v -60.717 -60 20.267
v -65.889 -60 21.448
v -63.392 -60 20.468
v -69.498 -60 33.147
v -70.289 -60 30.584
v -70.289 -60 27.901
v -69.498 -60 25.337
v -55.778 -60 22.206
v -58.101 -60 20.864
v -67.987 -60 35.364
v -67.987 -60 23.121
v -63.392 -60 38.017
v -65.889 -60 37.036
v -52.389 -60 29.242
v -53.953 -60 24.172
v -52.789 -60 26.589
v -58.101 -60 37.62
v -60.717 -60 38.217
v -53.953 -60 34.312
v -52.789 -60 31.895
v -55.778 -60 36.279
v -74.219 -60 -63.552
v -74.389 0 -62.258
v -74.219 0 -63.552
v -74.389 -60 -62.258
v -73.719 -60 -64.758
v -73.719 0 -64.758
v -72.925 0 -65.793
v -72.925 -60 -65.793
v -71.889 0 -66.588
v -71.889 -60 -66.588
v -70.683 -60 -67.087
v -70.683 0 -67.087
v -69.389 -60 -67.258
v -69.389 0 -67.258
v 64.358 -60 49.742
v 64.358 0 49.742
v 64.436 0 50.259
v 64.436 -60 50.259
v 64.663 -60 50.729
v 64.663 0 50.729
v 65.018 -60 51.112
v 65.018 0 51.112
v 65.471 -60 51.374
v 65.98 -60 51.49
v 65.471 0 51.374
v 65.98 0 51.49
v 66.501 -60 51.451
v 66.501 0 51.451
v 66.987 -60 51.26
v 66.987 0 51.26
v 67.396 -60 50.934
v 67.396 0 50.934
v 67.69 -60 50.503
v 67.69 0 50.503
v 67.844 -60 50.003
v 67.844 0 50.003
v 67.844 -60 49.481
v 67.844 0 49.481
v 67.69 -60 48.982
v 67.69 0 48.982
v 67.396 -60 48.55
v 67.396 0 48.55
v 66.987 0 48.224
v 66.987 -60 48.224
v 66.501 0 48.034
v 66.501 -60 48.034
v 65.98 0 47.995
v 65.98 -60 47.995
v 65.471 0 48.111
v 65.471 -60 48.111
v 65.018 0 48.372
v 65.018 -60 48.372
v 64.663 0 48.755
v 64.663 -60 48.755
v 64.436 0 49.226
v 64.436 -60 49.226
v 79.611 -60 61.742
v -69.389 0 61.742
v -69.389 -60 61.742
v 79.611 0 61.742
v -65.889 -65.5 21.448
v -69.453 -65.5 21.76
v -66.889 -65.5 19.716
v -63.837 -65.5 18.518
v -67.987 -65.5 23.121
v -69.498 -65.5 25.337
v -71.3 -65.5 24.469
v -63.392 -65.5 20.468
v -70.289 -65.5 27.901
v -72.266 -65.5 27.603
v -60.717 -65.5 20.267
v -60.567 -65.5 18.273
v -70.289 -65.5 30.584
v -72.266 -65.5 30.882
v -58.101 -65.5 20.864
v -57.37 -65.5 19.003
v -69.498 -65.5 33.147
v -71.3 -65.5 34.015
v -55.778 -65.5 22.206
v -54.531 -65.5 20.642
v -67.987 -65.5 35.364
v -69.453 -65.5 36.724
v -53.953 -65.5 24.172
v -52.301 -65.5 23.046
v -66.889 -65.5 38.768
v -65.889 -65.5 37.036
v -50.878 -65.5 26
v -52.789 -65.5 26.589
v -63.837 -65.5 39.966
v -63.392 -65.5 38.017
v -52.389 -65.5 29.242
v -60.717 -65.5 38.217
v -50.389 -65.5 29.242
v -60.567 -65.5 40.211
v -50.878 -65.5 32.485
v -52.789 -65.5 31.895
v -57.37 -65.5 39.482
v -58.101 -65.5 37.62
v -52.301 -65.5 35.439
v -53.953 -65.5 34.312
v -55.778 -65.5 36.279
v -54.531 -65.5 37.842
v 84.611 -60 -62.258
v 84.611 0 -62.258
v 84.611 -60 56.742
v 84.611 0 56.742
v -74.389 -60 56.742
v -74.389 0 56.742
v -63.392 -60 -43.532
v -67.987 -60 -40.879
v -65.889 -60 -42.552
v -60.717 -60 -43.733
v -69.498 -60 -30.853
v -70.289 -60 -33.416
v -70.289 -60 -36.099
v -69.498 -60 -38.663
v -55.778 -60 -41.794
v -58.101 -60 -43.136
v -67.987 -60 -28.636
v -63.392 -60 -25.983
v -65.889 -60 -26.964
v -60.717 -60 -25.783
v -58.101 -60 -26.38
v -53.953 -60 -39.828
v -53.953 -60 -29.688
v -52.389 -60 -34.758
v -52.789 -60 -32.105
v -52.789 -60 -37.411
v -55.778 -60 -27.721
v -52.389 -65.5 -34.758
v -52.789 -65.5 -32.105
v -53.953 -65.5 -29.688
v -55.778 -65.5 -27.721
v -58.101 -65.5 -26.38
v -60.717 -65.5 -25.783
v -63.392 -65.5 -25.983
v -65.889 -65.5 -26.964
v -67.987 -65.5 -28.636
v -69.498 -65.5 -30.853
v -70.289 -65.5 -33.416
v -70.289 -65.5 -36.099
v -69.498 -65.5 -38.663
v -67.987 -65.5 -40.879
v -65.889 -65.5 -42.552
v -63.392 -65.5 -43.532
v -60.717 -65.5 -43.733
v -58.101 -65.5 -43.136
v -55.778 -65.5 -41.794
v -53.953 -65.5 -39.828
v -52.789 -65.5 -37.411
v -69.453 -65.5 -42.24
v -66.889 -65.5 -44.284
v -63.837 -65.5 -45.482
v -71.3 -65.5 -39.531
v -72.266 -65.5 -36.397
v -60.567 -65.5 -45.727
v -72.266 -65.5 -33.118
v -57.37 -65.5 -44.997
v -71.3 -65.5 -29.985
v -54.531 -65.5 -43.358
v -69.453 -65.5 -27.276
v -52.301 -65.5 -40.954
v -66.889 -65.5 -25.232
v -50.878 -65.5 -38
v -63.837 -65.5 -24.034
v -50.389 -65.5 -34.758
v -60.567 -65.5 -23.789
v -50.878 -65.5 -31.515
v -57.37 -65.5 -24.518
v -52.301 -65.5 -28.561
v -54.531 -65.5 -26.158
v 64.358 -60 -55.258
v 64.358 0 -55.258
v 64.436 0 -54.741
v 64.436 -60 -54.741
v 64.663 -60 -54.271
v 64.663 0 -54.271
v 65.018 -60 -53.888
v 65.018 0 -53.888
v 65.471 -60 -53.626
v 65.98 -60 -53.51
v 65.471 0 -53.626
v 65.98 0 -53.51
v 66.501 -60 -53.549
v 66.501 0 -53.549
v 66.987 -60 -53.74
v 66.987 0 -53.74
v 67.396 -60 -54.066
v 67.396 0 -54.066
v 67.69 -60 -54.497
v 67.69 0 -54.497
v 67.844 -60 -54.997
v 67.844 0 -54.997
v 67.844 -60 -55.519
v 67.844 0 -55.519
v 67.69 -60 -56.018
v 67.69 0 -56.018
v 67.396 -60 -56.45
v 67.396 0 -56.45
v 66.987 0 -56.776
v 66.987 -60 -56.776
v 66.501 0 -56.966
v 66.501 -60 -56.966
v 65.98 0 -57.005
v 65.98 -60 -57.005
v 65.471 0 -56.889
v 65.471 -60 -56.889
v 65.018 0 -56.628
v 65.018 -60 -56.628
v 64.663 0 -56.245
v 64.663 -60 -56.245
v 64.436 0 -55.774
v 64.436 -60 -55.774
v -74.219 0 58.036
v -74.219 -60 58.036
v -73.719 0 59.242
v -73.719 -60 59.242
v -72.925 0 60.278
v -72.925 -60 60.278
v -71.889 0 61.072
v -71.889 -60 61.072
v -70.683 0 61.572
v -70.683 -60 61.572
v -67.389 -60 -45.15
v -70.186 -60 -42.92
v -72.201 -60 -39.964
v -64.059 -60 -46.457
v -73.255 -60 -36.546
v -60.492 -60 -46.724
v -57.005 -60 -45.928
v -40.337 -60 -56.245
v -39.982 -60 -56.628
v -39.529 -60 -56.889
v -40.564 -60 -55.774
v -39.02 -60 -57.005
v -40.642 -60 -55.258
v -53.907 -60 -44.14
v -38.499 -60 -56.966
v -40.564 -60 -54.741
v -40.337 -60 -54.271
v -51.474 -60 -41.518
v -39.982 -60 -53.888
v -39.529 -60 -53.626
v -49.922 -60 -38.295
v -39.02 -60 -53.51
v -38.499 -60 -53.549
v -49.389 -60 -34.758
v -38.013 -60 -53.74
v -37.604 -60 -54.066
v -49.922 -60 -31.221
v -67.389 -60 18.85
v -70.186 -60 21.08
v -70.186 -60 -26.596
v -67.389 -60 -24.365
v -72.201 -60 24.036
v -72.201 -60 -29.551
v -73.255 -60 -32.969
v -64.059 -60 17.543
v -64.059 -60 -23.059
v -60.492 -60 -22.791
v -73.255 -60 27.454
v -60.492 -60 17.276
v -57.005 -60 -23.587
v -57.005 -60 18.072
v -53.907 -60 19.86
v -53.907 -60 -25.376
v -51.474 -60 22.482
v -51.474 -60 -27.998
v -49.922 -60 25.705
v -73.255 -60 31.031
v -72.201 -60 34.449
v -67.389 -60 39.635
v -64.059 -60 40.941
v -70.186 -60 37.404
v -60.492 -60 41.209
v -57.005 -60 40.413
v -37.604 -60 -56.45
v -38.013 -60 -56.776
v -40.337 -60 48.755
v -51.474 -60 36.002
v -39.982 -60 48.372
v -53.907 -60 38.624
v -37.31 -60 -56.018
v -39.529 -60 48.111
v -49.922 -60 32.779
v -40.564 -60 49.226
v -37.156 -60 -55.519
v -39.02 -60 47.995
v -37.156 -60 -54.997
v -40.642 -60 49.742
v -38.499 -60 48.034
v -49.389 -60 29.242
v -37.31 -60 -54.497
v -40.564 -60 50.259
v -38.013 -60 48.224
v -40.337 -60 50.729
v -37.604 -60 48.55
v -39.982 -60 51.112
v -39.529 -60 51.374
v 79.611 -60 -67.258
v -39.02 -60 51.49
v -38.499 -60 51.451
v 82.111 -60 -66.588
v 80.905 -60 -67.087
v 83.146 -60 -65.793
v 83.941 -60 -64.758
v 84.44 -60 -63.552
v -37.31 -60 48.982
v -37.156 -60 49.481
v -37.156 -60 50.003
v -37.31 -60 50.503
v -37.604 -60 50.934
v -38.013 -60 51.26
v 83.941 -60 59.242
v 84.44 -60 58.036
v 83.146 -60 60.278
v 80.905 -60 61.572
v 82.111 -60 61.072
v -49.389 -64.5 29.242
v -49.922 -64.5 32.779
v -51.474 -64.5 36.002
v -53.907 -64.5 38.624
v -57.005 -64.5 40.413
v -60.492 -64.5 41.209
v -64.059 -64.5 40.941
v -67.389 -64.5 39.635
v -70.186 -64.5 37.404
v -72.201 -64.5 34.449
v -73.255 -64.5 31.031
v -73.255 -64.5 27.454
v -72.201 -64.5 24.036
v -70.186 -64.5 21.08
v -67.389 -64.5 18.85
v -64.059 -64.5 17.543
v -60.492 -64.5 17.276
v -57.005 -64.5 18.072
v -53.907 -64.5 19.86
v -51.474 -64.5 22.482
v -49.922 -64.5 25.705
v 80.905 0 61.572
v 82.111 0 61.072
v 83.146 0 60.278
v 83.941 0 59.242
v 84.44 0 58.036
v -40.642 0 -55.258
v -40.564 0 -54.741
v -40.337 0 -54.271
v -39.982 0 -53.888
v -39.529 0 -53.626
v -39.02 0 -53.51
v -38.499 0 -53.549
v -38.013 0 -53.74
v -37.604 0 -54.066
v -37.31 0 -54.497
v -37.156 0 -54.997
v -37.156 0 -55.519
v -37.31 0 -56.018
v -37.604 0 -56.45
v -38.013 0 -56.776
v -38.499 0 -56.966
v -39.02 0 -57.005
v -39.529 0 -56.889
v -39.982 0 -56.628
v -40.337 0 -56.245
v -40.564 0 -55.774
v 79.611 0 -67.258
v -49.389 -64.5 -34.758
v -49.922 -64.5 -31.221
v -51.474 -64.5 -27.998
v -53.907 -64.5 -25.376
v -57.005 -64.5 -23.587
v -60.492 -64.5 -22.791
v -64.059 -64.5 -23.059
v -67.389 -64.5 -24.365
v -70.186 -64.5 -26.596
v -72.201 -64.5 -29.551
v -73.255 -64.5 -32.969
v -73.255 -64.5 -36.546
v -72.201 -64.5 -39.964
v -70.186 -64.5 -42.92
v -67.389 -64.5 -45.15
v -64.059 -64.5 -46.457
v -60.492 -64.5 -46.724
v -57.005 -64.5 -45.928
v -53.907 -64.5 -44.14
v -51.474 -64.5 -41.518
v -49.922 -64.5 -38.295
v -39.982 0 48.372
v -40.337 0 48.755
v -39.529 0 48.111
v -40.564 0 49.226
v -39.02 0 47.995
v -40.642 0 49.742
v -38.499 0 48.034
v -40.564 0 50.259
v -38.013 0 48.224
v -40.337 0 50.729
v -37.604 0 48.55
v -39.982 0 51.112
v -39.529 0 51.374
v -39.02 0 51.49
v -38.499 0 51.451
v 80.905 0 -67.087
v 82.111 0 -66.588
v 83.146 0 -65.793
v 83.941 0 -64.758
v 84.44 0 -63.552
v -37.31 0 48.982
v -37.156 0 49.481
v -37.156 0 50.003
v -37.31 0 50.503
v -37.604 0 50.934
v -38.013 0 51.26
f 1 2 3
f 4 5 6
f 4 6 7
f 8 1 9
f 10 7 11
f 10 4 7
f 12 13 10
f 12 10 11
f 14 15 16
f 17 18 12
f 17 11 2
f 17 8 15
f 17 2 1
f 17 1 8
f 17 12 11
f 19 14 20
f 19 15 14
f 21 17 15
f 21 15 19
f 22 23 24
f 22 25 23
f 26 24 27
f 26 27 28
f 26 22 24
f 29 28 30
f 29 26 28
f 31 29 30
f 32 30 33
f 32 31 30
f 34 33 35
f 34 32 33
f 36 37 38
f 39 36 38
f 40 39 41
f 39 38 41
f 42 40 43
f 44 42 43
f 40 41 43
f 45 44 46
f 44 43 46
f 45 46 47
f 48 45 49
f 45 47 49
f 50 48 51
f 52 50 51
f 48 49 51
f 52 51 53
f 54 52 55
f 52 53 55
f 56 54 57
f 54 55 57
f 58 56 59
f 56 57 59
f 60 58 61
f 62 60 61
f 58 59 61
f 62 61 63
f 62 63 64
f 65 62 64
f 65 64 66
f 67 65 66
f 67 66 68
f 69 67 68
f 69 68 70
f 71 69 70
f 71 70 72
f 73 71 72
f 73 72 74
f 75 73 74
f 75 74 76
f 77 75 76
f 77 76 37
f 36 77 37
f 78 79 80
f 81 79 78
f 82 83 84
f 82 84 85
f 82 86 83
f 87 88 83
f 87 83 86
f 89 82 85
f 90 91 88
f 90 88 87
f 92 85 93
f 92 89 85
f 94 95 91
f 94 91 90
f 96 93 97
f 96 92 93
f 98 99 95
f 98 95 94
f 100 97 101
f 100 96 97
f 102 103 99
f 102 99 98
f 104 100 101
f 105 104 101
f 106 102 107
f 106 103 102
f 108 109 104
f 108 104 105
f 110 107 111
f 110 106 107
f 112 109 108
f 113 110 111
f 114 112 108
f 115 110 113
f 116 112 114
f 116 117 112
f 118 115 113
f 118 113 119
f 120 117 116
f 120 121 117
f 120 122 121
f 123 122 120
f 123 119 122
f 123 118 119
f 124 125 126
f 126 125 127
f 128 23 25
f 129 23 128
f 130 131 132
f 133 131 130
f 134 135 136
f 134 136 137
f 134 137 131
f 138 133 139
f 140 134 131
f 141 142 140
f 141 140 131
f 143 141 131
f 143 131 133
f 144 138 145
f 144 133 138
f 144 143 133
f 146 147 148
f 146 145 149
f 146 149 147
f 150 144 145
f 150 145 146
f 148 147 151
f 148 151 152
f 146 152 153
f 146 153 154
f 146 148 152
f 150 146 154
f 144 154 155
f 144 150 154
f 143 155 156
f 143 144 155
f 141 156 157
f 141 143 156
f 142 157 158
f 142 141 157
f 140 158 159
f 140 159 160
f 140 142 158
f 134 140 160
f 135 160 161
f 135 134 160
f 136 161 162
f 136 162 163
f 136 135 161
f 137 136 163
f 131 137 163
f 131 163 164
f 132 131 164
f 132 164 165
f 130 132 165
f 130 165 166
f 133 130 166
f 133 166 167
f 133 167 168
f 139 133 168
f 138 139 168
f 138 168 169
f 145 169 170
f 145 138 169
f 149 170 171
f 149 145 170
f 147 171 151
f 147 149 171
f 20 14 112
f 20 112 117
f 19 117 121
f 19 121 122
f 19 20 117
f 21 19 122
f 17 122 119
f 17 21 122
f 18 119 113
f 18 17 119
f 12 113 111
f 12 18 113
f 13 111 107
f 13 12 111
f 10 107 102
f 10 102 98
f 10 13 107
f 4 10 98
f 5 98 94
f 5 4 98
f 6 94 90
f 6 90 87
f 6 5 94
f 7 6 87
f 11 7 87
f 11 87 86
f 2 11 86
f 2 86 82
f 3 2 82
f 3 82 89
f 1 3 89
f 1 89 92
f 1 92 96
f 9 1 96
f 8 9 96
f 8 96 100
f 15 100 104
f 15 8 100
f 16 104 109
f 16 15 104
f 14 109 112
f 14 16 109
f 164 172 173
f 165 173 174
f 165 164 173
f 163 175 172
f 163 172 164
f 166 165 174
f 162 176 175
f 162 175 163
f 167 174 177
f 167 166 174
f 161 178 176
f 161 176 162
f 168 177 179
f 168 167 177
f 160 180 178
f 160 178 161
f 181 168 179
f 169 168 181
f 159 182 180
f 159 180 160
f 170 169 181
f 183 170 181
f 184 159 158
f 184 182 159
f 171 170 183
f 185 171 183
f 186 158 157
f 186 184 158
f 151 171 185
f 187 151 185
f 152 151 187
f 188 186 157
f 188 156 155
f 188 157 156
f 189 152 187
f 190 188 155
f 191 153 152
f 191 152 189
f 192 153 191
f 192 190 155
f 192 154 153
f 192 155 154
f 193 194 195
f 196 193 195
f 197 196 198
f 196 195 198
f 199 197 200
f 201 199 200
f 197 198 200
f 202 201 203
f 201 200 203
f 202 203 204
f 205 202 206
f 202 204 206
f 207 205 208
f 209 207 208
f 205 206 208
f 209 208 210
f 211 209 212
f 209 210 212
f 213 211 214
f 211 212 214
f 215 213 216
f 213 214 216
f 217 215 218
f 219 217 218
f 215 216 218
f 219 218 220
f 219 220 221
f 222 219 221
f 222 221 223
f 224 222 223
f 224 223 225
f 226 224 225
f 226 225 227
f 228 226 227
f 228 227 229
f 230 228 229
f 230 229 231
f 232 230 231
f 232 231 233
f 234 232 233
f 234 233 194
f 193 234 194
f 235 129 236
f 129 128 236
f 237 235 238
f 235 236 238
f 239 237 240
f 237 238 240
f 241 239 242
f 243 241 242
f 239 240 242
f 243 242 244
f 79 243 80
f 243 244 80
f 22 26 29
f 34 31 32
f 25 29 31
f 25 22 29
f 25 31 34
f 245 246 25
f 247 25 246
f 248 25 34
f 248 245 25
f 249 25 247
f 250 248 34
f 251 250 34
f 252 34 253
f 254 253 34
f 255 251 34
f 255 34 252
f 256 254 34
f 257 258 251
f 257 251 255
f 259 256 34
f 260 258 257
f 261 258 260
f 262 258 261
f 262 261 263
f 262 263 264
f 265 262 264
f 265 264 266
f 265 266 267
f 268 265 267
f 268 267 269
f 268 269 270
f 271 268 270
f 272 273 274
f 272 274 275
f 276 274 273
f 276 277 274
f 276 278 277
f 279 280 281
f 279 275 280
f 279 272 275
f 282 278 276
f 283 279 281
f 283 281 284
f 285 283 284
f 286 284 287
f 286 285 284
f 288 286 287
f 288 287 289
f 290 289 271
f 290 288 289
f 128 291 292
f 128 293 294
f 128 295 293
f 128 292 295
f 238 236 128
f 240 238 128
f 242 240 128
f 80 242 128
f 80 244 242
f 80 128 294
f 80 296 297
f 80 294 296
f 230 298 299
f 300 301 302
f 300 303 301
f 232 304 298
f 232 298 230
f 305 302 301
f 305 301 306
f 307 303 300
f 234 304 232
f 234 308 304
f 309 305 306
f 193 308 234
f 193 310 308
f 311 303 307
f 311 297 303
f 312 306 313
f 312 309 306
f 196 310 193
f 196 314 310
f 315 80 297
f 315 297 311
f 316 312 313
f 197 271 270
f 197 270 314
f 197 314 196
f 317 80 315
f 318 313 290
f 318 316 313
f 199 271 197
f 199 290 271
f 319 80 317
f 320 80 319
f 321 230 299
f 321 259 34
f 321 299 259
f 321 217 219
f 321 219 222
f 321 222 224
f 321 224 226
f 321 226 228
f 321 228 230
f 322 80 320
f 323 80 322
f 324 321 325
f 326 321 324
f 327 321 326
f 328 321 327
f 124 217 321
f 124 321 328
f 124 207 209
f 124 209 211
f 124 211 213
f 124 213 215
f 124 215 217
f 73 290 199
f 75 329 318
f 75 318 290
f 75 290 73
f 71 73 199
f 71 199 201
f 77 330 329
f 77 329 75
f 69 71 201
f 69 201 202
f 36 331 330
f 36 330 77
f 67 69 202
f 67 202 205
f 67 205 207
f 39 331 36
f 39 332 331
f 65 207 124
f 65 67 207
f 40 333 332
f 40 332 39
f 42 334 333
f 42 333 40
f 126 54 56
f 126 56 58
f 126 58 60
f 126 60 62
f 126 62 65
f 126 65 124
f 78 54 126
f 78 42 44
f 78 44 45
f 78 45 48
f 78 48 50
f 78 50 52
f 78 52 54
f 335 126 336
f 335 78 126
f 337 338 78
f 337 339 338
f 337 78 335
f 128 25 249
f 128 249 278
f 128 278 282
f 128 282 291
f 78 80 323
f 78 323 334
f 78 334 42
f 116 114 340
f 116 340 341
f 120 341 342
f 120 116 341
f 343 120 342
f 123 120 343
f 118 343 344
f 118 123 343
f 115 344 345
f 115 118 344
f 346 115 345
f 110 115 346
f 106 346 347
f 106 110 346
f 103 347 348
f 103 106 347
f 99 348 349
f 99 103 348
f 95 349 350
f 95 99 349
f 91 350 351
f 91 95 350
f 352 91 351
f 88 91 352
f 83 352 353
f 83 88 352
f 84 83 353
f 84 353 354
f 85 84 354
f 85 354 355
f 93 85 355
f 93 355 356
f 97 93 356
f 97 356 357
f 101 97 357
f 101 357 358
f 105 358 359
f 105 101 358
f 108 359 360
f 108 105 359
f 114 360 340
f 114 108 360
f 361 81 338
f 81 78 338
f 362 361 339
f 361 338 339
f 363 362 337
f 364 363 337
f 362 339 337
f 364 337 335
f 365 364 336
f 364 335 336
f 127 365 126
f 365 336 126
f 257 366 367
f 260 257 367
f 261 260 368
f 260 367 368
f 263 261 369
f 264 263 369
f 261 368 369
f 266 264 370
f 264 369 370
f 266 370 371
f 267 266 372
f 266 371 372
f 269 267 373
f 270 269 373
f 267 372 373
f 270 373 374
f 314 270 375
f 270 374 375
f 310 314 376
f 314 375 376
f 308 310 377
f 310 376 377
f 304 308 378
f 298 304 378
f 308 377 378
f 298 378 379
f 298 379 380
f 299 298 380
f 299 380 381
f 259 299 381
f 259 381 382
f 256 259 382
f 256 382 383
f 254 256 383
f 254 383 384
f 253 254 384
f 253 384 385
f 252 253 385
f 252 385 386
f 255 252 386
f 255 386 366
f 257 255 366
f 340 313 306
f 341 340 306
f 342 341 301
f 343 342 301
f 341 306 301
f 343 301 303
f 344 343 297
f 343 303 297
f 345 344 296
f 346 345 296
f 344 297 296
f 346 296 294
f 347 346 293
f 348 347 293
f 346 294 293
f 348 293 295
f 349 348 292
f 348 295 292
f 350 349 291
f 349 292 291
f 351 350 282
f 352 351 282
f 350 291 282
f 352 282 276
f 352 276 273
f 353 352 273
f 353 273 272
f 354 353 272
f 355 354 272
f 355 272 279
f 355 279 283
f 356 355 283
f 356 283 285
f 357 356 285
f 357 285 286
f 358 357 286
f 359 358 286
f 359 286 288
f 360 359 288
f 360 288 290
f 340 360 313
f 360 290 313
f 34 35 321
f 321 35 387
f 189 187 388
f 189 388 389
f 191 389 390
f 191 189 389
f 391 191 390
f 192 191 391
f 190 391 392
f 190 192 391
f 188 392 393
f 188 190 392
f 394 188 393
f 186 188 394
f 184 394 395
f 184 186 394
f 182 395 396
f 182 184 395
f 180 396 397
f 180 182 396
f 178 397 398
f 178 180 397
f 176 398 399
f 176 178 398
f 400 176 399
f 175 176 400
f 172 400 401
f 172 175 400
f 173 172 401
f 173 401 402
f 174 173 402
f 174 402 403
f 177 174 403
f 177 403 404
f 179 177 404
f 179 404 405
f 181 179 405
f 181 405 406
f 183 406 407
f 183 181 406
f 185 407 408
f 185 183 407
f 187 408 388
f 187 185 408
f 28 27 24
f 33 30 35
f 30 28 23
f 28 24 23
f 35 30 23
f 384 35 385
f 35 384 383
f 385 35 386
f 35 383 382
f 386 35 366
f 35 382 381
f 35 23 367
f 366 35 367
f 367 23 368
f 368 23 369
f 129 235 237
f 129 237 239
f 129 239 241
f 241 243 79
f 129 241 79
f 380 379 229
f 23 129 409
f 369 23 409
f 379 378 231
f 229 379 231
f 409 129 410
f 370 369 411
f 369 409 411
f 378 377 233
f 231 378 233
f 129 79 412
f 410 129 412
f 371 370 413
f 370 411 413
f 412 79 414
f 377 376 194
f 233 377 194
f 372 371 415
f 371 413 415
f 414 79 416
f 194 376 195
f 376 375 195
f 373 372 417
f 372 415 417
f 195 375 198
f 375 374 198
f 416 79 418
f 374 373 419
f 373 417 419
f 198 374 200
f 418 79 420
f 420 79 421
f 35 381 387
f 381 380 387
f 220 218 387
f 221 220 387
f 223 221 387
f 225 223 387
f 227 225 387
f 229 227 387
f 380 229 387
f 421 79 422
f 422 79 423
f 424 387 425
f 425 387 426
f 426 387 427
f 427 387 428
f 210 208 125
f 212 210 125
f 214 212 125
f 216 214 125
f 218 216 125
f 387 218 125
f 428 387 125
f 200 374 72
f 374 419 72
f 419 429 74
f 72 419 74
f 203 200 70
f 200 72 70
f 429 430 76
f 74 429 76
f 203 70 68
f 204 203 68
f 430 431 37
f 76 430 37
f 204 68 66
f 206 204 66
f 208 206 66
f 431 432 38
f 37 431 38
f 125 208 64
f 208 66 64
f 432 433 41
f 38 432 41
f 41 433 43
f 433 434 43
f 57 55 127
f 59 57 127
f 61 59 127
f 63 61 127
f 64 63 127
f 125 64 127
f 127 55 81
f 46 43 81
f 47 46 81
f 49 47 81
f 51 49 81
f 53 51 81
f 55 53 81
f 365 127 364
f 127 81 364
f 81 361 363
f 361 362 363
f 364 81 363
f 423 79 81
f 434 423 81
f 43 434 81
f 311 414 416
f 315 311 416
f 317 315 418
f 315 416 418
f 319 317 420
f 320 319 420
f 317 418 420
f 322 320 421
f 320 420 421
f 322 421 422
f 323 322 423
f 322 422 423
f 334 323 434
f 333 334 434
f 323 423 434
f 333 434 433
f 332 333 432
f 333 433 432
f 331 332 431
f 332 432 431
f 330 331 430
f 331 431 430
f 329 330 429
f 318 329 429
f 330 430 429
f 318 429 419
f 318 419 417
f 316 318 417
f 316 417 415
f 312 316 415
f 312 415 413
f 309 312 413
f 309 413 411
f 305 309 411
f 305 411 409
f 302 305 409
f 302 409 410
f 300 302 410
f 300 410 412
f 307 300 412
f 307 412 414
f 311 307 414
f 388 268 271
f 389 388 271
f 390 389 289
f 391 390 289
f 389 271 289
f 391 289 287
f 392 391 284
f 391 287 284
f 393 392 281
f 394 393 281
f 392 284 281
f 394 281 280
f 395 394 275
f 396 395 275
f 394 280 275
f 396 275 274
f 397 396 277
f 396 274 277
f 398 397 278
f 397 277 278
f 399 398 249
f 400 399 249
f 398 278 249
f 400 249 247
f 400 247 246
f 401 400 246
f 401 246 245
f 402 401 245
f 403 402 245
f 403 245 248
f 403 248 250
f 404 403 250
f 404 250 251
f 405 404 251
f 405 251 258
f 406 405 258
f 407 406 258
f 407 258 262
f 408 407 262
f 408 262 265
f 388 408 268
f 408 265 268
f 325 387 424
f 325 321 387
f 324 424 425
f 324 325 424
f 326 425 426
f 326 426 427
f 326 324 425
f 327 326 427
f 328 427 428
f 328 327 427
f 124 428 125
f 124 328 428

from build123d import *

# Parameters (mm, degrees)
F0_W     = 159
F0_H     = 129
F1_DEPTH = 60
F2_R     = 12
F2_R_2   = 9
F3_DEPTH = 5.5
F4_R     = 5
F6_D     = 3.505
F7_SIZE  = 1


with BuildPart() as f1:
    # F0 (on Front) → F1 (new body)
    with BuildSketch(Plane.XZ):
        with Locations((5.110869, -2.757801)):
            Rectangle(F0_W, F0_H)
    extrude(amount=F1_DEPTH)

    # F2 (on face) → F3 (join)
    with BuildSketch(Plane.XZ.offset(60)):
        with Locations((-61.389131, 29.242199)):
            Circle(F2_R)
        with Locations((-61.389131, 29.242199)):
            Circle(F2_R_2, mode=Mode.SUBTRACT)
        with Locations((-61.389131, -34.757801)):
            Circle(F2_R)
        with Locations((-61.389131, -34.757801)):
            Circle(F2_R_2, mode=Mode.SUBTRACT)
    extrude(amount=F3_DEPTH)

    # F4
    f4_edges = [f1.edges().sort_by_distance(p)[0] for p in [
        (84.610869, -30, -67.257801),
        (84.610869, -30, 61.742199),
        (-74.389131, -30, 61.742199),
        (-74.389131, -30, -67.257801),
    ]]
    fillet(f4_edges, radius=F4_R)

    # F6 (through all)
    with Locations(Plane.XZ.offset(60)):
        with Locations((-38.889131, 49.742199), (66.110869, 49.742199), (-38.889131, -55.257801), (66.110869, -55.257801)):
            Hole(F6_D / 2)

    # F7
    f7_edges = [f1.edges().sort_by_distance(p)[0] for p in [
        (-73.389131, -65.5, 29.242199),
        (-73.389131, -65.5, -34.757801),
    ]]
    chamfer(f7_edges, length=F7_SIZE)


solid = f1.part
